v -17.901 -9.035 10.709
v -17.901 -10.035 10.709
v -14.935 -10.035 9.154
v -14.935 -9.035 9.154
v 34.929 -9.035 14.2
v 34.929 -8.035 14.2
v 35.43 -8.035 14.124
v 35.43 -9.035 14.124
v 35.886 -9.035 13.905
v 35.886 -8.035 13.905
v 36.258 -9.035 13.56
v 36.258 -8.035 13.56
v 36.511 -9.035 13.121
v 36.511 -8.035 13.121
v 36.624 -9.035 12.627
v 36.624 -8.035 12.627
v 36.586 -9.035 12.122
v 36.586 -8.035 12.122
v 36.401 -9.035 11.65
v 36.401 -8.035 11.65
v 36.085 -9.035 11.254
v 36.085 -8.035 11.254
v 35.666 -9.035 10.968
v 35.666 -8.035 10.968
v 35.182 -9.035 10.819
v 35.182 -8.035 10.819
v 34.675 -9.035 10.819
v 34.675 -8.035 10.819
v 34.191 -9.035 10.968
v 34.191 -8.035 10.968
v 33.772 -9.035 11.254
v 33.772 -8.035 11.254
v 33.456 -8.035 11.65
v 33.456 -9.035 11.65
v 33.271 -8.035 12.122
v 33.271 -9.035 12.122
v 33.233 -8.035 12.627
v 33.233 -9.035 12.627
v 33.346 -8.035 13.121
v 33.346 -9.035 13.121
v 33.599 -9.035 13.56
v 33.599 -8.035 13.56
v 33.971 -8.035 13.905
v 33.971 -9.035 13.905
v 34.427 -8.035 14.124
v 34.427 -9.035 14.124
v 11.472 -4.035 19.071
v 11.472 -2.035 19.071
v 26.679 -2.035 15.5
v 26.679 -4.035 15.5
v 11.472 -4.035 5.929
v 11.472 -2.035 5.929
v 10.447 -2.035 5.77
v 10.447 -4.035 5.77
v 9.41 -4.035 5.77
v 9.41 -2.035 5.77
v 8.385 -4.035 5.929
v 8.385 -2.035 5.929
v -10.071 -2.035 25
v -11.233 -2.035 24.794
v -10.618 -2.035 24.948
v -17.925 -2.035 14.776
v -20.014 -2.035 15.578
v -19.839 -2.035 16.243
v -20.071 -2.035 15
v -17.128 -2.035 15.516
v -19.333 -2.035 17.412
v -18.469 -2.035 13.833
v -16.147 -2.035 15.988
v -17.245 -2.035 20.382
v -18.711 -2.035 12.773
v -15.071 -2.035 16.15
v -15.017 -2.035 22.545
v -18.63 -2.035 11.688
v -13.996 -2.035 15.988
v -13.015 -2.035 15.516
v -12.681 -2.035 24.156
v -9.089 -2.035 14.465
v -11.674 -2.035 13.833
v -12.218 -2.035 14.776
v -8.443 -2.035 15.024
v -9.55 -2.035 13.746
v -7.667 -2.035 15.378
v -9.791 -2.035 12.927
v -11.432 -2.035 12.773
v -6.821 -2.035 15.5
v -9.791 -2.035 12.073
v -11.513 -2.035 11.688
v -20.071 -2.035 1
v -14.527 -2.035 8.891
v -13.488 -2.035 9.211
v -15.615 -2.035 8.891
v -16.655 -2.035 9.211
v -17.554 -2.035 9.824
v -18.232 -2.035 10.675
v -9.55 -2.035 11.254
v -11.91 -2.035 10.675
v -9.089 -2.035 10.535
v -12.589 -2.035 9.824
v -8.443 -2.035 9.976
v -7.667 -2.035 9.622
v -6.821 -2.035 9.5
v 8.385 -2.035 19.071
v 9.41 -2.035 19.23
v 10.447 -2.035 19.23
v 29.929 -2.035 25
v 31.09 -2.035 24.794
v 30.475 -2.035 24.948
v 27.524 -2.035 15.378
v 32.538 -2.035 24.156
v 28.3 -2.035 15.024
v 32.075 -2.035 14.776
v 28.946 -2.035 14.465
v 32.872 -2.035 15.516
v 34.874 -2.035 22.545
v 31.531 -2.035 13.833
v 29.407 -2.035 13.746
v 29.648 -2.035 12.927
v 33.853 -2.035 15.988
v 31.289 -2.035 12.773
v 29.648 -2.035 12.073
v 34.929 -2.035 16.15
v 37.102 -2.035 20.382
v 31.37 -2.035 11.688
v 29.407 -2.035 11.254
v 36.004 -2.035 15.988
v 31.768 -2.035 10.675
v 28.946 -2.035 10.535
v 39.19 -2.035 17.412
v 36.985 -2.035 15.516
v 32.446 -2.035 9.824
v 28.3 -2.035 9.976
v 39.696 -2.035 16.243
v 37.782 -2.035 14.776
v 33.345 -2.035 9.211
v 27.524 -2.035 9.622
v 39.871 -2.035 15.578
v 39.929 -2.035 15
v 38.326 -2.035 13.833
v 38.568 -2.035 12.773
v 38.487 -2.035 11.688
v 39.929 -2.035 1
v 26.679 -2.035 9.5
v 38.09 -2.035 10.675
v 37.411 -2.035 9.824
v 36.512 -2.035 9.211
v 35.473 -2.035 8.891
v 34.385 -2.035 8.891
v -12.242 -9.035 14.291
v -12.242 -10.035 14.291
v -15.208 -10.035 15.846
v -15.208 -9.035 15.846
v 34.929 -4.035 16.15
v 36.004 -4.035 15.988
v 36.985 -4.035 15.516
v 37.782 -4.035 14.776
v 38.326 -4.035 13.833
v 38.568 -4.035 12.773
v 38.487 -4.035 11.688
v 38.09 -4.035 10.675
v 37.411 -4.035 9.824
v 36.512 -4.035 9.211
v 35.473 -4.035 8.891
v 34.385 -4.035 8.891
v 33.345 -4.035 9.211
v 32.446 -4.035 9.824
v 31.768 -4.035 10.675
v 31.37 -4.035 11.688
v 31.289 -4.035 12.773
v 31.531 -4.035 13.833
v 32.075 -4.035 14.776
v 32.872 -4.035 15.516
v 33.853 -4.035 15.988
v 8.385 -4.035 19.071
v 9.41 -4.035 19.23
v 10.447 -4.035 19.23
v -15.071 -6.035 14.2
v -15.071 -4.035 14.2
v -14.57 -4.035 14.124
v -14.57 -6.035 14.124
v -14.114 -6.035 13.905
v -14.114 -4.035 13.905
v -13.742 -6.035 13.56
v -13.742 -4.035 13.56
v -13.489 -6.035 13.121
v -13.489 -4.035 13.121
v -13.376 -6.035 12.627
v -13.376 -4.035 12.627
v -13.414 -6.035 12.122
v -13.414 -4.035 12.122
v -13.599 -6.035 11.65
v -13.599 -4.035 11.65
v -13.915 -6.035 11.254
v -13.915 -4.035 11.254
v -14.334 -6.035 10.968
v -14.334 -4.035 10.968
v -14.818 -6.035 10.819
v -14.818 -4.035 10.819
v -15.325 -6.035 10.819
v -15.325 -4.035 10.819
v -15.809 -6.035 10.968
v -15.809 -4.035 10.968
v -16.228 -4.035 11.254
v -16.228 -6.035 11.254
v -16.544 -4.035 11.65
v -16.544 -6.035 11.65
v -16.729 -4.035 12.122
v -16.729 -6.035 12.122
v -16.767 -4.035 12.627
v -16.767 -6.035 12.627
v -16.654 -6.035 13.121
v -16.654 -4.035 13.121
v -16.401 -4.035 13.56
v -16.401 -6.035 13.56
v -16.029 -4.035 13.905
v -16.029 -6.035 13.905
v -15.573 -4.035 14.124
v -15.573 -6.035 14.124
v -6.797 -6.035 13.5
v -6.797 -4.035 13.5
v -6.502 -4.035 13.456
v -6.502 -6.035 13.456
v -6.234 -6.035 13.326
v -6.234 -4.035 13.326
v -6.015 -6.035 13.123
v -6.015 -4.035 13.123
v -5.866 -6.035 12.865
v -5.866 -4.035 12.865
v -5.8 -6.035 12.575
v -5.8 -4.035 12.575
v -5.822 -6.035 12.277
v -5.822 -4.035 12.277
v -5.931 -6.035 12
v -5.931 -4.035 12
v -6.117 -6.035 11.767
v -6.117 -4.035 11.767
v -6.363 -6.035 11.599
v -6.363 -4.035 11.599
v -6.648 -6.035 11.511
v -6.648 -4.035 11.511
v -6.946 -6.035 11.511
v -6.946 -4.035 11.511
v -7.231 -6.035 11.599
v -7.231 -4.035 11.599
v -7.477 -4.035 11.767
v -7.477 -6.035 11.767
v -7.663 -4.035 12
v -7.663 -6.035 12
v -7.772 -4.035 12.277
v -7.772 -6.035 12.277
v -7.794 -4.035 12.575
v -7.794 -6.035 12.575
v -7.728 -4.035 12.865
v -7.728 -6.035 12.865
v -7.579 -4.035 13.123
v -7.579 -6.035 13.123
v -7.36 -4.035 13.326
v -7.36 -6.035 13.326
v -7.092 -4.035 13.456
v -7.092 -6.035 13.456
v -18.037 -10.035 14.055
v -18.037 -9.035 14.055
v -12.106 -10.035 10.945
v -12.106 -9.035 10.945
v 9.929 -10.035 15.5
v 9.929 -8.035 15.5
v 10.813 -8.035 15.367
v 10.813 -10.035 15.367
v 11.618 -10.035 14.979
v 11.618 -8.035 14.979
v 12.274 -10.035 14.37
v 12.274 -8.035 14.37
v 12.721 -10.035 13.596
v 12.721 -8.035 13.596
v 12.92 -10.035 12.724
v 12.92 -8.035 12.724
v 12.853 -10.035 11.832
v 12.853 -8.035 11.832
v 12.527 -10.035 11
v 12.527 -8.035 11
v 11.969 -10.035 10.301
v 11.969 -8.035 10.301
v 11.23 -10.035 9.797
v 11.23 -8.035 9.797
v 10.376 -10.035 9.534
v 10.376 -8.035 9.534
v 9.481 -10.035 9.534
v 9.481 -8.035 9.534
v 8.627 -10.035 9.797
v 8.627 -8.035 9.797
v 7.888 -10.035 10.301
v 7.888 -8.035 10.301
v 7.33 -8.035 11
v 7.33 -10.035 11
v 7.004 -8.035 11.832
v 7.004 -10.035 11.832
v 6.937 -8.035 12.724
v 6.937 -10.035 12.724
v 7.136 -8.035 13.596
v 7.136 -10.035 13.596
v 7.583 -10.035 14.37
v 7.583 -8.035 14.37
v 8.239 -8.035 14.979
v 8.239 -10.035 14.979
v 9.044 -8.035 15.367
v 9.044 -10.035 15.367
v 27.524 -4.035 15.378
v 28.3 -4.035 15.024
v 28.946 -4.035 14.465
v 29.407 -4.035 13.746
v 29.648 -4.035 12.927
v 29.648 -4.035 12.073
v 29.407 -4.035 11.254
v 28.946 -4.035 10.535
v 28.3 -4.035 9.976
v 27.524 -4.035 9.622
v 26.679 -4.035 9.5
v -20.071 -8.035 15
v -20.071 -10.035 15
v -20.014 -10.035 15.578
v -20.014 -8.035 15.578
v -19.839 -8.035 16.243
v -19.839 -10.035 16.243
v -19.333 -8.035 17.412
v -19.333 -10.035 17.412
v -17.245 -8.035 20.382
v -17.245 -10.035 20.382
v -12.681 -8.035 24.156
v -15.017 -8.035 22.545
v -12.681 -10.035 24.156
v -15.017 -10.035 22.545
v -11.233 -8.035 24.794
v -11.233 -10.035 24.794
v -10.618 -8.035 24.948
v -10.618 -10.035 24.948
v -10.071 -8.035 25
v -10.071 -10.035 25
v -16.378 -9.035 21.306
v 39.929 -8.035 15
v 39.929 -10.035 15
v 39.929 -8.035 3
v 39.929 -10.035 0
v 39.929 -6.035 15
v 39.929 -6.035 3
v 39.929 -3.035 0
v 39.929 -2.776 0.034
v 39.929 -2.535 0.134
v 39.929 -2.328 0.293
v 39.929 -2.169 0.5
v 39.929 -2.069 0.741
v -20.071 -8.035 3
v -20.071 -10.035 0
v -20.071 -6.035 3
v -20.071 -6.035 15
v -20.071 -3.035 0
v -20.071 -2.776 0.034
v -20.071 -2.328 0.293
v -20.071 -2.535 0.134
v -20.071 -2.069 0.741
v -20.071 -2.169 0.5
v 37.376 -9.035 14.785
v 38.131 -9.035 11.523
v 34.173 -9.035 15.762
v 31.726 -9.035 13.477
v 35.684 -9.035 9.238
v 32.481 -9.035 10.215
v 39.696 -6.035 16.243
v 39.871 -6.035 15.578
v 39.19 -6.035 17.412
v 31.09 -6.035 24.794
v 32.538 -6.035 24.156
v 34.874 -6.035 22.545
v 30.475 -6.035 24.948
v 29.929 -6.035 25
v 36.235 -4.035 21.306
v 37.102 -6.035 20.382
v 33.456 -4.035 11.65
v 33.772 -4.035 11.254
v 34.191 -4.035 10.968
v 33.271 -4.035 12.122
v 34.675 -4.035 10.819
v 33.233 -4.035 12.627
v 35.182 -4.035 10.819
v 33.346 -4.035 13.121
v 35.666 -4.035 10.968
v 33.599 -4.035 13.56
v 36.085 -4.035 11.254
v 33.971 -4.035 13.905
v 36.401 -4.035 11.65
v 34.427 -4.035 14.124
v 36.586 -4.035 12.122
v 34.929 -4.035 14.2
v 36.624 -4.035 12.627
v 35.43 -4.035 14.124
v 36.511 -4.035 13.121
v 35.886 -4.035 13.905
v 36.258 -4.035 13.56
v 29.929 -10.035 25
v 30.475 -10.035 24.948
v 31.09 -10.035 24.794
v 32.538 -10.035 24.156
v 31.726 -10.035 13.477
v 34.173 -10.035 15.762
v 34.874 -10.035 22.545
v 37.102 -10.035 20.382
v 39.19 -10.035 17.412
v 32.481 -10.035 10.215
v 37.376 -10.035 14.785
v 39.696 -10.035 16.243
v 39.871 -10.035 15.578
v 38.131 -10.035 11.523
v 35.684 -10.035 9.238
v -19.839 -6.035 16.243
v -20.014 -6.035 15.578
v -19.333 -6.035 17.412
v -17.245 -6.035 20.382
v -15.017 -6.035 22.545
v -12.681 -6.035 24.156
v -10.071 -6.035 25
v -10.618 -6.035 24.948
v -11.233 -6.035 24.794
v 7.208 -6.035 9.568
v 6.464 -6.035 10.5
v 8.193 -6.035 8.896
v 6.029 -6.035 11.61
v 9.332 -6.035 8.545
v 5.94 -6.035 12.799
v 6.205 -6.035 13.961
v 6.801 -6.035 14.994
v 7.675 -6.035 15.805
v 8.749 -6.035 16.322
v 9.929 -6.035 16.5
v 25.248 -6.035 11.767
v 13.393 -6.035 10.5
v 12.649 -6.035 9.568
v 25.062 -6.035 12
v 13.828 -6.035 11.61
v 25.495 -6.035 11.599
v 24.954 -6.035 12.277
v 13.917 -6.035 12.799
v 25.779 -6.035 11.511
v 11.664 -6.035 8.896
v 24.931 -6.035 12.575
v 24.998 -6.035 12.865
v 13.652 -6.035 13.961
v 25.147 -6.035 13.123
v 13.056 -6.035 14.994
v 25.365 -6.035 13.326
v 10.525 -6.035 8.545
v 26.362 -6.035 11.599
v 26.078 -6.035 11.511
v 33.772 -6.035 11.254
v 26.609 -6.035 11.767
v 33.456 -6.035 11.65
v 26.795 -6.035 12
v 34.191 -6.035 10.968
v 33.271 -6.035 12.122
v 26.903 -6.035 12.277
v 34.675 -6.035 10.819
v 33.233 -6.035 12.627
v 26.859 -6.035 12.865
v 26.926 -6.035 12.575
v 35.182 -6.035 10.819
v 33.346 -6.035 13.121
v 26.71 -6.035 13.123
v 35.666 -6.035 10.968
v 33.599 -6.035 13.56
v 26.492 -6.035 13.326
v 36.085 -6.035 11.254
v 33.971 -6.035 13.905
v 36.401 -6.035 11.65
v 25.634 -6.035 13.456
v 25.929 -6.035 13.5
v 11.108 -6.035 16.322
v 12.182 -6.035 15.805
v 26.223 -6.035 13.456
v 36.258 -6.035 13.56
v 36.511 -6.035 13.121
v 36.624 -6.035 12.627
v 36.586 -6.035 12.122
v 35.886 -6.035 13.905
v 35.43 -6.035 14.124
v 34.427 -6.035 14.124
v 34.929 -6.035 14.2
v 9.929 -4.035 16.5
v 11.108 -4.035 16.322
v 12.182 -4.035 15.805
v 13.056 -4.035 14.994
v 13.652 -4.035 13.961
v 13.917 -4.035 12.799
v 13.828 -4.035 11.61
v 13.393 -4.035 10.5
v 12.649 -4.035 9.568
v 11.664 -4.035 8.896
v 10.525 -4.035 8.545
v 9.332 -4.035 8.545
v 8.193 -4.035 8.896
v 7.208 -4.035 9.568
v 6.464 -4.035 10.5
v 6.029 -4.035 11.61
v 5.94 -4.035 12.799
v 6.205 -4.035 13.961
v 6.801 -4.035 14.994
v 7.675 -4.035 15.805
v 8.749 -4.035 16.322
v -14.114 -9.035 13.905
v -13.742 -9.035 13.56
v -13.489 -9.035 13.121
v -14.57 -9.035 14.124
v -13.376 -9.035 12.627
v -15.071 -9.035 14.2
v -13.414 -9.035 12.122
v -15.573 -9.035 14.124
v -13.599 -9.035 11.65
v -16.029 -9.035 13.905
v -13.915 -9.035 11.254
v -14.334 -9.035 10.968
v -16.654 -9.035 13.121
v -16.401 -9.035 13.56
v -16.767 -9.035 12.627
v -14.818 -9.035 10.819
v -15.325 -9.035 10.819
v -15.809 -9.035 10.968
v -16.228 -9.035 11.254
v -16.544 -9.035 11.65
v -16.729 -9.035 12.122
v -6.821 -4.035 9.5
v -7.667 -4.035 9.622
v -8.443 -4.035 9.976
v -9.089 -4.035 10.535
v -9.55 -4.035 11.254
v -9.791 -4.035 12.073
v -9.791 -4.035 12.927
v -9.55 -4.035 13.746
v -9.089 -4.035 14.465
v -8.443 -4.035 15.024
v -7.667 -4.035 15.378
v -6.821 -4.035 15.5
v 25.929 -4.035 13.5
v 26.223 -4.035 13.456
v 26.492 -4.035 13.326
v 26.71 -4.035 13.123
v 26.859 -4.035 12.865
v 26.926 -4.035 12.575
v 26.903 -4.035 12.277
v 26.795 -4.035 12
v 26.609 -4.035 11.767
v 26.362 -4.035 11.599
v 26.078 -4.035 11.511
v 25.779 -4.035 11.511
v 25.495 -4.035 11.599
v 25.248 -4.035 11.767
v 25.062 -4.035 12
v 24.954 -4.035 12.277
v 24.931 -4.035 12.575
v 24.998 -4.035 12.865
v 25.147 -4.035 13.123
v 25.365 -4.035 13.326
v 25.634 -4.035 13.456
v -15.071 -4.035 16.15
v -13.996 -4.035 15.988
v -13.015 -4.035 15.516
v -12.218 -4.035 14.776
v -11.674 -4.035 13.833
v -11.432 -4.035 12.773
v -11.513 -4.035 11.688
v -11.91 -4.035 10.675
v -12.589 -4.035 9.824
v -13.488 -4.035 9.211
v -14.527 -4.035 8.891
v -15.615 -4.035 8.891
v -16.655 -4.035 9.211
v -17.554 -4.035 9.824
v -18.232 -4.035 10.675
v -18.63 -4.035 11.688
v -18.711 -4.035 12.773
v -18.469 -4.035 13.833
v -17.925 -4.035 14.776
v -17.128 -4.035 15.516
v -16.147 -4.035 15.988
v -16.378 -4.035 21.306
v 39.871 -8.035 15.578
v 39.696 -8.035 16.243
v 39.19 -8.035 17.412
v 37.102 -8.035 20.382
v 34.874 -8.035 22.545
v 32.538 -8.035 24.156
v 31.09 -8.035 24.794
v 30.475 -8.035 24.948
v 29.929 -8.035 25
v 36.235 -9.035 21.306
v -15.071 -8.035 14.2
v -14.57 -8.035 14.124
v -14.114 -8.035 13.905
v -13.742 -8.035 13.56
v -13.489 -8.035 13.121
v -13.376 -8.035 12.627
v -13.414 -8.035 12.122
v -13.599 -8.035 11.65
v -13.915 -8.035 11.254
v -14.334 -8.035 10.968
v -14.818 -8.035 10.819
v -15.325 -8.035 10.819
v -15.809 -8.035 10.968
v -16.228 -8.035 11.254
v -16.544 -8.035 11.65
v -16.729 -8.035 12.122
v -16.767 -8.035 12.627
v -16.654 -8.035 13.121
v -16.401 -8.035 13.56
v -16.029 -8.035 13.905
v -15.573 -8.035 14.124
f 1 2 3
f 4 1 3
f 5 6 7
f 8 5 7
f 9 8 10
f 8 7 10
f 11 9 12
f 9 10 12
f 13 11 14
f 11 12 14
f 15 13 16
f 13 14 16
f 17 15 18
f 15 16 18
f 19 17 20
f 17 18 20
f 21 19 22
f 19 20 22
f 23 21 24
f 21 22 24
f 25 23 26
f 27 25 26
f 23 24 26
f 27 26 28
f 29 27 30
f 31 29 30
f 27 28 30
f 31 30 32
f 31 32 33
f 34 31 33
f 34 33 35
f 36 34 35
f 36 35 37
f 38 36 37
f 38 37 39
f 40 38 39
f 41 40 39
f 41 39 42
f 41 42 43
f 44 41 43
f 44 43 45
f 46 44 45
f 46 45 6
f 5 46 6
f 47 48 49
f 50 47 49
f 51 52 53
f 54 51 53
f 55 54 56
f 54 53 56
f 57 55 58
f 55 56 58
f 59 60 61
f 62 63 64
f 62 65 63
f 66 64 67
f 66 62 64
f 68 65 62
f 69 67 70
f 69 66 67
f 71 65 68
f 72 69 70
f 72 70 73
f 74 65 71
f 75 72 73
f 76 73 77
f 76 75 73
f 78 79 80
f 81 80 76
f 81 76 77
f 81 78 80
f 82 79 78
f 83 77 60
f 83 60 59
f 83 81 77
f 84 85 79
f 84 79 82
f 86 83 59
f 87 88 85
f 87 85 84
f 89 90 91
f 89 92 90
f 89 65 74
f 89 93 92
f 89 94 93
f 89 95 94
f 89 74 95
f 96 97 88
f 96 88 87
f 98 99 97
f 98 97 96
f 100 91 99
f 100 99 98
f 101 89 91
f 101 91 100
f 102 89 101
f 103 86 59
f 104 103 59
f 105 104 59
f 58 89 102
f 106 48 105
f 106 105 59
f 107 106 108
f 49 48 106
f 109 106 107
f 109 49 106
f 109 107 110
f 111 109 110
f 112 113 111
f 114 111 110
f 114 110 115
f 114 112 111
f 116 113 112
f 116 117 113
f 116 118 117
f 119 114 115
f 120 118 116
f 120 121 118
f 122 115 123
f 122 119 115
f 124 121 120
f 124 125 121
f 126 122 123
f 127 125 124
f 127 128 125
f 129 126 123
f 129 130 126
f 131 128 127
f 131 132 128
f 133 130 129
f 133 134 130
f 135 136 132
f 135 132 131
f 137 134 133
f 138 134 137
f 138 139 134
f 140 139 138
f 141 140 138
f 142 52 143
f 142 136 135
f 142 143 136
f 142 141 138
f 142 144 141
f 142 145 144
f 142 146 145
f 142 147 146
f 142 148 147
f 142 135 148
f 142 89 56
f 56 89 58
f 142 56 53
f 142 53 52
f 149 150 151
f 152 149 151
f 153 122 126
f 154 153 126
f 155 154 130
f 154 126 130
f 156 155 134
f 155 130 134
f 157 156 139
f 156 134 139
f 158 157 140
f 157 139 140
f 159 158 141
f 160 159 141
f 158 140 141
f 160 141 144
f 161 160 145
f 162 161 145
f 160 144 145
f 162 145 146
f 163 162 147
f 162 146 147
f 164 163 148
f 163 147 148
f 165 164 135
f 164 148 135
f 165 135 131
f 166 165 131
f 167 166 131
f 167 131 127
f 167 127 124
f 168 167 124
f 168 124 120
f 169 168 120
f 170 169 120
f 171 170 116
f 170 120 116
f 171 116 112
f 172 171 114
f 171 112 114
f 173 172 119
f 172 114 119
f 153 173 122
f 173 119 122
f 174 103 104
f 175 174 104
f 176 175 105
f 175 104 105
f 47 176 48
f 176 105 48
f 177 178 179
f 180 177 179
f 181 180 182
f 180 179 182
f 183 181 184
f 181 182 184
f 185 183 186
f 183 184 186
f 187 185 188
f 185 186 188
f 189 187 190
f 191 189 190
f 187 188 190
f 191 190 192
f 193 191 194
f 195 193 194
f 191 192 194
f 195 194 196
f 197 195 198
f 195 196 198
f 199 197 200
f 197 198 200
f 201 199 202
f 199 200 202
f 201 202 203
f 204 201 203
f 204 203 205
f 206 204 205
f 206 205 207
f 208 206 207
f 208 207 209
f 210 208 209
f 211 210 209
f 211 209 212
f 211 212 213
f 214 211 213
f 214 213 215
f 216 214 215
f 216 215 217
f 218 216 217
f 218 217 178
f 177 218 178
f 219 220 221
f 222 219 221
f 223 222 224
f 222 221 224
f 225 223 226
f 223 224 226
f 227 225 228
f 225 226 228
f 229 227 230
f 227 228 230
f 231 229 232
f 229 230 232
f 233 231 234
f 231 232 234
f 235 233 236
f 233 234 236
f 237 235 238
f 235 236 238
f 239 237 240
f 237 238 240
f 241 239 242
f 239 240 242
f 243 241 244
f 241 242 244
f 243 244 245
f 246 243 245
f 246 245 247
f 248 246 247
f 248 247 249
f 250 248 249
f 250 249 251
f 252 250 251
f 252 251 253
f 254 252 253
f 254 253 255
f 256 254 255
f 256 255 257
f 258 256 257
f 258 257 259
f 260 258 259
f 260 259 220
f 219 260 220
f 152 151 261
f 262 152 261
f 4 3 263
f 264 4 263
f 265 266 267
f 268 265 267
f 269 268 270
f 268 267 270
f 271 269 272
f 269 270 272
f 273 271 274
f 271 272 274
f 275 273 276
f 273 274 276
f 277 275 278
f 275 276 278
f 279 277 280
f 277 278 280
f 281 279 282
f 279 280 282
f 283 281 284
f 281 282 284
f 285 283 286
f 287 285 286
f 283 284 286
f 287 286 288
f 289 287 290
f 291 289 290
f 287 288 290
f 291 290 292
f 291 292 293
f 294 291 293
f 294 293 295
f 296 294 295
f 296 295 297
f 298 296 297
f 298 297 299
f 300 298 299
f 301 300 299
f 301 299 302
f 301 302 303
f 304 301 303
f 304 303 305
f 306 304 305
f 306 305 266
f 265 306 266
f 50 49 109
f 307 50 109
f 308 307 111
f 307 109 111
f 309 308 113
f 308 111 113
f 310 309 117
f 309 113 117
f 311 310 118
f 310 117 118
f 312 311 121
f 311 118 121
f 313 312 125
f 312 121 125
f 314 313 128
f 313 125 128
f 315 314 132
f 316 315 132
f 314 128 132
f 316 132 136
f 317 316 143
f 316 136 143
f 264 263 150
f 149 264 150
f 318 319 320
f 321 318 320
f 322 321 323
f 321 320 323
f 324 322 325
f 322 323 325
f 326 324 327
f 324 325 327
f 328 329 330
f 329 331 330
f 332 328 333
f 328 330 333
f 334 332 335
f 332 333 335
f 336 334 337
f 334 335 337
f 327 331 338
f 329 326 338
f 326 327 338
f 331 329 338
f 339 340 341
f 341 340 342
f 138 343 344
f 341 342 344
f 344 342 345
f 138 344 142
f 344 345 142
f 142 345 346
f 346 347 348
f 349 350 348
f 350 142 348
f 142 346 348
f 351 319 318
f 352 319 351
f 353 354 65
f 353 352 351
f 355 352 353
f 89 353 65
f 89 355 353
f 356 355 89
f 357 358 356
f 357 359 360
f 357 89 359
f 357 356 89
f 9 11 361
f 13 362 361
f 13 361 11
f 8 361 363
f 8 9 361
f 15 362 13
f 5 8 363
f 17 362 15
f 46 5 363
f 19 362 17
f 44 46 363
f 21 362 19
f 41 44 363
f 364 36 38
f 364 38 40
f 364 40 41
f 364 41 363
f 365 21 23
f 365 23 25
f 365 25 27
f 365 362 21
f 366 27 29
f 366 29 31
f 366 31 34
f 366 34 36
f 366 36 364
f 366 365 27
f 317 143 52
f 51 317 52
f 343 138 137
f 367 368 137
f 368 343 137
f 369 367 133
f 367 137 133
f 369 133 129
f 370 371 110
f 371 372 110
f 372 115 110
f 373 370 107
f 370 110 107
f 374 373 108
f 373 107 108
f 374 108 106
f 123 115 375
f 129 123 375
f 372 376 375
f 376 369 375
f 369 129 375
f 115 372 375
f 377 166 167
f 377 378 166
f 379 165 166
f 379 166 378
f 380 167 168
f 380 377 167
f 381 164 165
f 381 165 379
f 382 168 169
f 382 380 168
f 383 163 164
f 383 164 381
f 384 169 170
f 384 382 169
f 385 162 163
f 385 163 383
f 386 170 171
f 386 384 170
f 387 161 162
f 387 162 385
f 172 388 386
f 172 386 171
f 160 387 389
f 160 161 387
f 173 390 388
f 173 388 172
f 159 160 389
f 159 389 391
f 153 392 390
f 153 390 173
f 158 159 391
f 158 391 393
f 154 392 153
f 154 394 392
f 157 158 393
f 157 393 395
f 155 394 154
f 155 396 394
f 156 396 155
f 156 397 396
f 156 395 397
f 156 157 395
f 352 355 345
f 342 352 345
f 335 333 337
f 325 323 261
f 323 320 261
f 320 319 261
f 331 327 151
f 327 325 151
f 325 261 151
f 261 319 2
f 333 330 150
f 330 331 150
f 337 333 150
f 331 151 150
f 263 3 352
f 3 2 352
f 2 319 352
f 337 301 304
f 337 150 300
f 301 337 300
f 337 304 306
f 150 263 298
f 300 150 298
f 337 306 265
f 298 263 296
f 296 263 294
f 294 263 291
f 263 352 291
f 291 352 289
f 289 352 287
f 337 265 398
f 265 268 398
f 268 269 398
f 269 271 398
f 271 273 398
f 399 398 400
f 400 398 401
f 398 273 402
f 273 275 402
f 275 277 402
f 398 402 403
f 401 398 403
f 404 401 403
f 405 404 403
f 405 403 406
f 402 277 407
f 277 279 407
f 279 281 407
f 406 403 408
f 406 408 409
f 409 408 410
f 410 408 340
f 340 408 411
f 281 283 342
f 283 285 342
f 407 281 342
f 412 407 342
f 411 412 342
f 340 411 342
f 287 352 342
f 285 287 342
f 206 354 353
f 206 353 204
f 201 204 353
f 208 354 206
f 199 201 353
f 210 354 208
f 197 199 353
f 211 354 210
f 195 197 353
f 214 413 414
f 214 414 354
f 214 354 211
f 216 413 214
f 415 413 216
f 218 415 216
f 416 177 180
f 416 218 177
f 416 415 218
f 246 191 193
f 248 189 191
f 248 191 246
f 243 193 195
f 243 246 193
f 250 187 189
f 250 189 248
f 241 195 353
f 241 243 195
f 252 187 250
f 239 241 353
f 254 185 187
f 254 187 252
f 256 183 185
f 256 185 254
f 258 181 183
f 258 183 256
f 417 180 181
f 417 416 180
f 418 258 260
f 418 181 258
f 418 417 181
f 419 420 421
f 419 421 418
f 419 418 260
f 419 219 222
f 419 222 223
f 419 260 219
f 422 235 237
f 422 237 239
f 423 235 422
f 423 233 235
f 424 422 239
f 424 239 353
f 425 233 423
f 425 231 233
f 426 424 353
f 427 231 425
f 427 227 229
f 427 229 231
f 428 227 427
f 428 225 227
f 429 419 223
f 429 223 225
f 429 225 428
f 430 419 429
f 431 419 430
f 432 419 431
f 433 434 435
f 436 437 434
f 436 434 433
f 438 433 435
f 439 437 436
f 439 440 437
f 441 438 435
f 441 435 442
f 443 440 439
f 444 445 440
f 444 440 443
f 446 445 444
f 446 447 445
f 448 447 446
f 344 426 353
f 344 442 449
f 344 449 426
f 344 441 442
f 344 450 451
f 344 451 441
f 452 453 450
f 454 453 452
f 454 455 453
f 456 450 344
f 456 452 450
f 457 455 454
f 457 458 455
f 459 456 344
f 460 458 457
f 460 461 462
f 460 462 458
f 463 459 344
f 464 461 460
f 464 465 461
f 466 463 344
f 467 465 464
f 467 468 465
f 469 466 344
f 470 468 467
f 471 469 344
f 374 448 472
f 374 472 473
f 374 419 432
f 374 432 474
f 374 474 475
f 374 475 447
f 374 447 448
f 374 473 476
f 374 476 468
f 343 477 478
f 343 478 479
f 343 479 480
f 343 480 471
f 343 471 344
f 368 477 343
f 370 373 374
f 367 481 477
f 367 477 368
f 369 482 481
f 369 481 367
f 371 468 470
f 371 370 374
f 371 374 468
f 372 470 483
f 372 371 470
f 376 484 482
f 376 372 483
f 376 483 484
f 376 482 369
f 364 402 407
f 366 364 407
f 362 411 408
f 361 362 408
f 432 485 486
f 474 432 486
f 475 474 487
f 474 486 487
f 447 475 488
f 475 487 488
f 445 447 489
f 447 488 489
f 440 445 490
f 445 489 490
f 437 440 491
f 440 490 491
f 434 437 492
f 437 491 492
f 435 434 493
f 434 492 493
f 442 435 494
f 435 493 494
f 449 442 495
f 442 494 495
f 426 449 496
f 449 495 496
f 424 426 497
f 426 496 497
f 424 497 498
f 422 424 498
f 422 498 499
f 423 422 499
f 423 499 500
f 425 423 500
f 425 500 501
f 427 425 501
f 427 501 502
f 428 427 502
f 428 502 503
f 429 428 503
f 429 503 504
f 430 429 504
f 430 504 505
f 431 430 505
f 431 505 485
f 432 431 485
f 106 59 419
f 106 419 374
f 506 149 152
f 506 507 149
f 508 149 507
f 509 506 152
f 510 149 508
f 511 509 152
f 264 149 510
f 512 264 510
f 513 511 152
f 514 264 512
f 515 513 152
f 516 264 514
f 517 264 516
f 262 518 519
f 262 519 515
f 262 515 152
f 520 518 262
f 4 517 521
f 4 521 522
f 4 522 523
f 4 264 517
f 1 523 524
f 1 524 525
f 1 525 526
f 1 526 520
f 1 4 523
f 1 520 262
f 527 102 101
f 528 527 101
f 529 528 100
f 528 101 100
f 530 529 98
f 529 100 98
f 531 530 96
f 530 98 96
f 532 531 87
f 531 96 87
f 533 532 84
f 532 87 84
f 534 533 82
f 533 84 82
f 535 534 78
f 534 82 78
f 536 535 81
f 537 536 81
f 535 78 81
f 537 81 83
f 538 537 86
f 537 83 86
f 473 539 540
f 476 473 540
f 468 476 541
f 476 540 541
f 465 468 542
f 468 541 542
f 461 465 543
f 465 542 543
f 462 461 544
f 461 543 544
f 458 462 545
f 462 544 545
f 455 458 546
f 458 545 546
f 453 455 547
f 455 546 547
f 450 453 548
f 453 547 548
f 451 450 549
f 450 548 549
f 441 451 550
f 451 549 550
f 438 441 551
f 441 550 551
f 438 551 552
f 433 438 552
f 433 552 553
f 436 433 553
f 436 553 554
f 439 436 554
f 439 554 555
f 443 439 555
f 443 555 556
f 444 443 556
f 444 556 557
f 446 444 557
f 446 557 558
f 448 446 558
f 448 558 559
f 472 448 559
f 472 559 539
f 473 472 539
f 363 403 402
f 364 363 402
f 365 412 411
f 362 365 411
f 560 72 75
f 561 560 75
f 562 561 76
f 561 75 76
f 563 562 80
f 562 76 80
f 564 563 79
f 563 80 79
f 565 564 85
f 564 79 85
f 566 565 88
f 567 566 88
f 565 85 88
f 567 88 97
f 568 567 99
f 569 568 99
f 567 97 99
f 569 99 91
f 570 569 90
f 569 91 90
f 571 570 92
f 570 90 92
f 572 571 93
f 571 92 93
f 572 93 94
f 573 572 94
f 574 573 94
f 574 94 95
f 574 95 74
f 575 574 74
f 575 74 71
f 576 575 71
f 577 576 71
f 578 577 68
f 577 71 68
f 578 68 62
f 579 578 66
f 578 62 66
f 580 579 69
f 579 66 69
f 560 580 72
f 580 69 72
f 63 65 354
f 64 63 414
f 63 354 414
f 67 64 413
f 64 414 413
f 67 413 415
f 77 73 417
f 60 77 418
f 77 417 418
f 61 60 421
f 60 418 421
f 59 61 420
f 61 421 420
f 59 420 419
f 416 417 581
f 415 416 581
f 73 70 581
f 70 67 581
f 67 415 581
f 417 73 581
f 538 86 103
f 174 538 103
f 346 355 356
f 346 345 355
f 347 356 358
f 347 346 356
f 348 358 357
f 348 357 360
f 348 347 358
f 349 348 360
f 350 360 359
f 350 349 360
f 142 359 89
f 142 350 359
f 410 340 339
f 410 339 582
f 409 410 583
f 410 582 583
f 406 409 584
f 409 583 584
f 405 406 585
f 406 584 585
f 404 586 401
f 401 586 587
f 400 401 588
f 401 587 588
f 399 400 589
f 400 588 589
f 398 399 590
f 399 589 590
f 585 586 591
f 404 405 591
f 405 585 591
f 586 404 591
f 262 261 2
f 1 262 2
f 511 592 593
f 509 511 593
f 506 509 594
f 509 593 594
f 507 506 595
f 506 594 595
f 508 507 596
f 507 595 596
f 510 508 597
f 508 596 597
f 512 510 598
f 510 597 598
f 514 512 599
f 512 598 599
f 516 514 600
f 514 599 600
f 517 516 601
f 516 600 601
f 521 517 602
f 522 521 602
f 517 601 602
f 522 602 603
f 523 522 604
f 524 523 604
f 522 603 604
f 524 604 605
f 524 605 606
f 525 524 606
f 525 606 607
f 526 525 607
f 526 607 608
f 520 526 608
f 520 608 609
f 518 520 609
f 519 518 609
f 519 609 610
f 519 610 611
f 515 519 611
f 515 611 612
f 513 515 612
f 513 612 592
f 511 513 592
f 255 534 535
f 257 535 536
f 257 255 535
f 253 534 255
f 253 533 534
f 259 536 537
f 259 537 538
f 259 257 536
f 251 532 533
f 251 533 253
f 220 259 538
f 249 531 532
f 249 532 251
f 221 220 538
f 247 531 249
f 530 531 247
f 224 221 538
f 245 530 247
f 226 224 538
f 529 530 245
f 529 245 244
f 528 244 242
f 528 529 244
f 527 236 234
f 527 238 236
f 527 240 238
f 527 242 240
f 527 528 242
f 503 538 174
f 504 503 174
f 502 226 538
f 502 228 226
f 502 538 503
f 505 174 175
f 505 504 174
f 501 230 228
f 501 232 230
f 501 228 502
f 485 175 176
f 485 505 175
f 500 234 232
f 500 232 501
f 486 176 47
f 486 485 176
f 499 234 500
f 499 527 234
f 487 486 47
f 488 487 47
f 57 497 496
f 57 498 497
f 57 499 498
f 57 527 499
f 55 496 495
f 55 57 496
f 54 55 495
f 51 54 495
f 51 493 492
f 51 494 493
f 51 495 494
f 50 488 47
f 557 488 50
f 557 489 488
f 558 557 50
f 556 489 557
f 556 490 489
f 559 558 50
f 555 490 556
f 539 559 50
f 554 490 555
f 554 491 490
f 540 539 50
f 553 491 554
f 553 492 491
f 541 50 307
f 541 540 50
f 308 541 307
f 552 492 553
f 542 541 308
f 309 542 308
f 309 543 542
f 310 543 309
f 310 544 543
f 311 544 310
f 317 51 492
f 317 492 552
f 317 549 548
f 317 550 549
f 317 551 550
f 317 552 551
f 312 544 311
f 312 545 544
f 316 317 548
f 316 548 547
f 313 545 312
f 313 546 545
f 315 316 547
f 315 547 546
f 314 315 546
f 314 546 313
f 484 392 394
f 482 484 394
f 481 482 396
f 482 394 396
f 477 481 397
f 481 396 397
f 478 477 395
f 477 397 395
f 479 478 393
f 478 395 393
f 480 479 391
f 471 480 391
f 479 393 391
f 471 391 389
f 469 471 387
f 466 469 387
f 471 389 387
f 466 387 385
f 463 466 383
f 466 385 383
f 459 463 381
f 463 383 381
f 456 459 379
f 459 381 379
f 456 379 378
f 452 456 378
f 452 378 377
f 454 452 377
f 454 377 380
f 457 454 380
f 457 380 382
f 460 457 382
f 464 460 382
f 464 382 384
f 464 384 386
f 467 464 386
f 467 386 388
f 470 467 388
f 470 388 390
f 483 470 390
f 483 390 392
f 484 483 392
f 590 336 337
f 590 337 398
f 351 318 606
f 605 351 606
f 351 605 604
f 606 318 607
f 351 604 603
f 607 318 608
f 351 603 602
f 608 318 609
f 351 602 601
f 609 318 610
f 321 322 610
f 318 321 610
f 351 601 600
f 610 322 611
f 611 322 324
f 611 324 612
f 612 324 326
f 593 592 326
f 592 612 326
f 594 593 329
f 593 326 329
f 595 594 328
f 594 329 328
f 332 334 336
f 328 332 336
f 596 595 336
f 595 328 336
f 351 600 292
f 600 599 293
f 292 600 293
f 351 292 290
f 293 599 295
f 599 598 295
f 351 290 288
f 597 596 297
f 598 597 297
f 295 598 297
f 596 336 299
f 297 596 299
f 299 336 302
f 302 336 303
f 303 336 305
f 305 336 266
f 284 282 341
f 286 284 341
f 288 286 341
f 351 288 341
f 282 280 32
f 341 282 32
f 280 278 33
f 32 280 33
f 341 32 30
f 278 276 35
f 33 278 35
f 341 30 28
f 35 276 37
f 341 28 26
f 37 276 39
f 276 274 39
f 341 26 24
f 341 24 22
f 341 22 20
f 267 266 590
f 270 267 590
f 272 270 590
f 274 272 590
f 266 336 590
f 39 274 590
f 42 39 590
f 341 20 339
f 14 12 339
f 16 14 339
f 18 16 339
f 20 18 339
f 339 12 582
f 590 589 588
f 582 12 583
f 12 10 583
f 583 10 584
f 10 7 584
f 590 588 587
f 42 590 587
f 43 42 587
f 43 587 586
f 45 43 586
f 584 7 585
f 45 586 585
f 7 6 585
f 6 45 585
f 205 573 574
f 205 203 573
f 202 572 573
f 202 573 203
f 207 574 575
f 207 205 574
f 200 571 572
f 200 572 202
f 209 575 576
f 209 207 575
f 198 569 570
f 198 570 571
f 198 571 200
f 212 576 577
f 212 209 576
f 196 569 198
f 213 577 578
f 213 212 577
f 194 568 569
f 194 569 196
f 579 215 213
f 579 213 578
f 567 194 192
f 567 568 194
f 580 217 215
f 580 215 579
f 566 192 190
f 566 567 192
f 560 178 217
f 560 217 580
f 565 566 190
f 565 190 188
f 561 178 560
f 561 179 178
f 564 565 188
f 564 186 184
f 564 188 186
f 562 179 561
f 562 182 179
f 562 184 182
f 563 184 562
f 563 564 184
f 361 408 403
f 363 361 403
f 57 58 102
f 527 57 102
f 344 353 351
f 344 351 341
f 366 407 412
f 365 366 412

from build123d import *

# Parameters (mm, degrees)
SKETCH1_W           = 60
SKETCH1_H           = 8
BOSS_EXTRUDE1_DEPTH = 25
SKETCH2_W           = 60
SKETCH2_H           = 2
CUT_EXTRUDE1_DEPTH  = 22
CUT_EXTRUDE2_DEPTH  = 2
SKETCH4_R           = 1
SKETCH4_R_2         = 4
CUT_EXTRUDE3_DEPTH  = 2.5
SKETCH5_R           = 1.7
CUT_EXTRUDE4_DEPTH  = 9
FILLET1_R           = 1
FILLET2_SIZE        = 10
SKETCH6_R           = 3
CUT_EXTRUDE5_DEPTH  = 4.5
CUT_EXTRUDE6_DEPTH  = 1
SKETCH8_R           = 3.65
CUT_EXTRUDE7_DEPTH  = 2


with BuildPart() as part:
    # Sketch1 → Boss-Extrude1 (new body)
    with BuildSketch(Plane.XY):
        with Locations((9.92851316, -6.03519833)):
            Rectangle(SKETCH1_W, SKETCH1_H)
    extrude(amount=BOSS_EXTRUDE1_DEPTH)

    # Sketch2 → Cut-Extrude1 (cut)
    with BuildSketch(Plane.XY.offset(25)):
        with Locations((9.92851316, -7.03519833)):
            Rectangle(SKETCH2_W, SKETCH2_H)
    extrude(amount=-CUT_EXTRUDE1_DEPTH, mode=Mode.SUBTRACT)

    # Sketch3 → Cut-Extrude2 (cut)
    with BuildSketch(Plane(origin=(0, -2.03519833, 0), x_dir=(1, 0, 0), z_dir=(0, 1, 0))):
        with BuildLine():
            Line((26.67851316, -9.5), (11.471726674, -5.928775453))
            ThreePointArc((11.471726674, -5.928775453), (9.92851316, -5.75), (8.385299646, -5.928775453))
            Line((8.385299646, -5.928775453), (-6.82148684, -9.5))
            ThreePointArc((-6.82148684, -9.5), (-9.821486841, -12.5), (-6.82148684, -15.5))
            Line((-6.82148684, -15.5), (8.385299646, -19.071224547))
            ThreePointArc((8.385299646, -19.071224547), (9.92851316, -19.25), (11.471726674, -19.071224547))
            Line((11.471726674, -19.071224547), (26.67851316, -15.5))
            ThreePointArc((26.67851316, -15.5), (29.67851316, -12.5), (26.67851316, -9.5))
        make_face()
    extrude(amount=-CUT_EXTRUDE2_DEPTH, mode=Mode.SUBTRACT)

    # Sketch4 → Cut-Extrude3 (cut)
    with BuildSketch(Plane(origin=(0, -4.03519833, 0), x_dir=(1, 0, 0), z_dir=(0, 1, 0))):
        with Locations(Location((-6.796927173, -12.5, 0), (0, 0, 270))):
            Circle(SKETCH4_R)
        with Locations(Location((9.92851316, -12.5, 0), (0, 0, 270))):
            Circle(SKETCH4_R_2)
        with Locations(Location((25.92851316, -12.5, 0), (0, 0, 270))):
            Circle(SKETCH4_R)
    extrude(amount=-CUT_EXTRUDE3_DEPTH, mode=Mode.SUBTRACT)

    # Sketch5 → Cut-Extrude4 (cut)
    with BuildSketch(Plane(origin=(0, -2.03519833, 0), x_dir=(1, 0, 0), z_dir=(0, 1, 0))):
        with Locations(Location((34.92851316, -12.5, 0), (0, 0, 270))):
            Circle(SKETCH5_R)
        with Locations(Location((-15.07148684, -12.5, 0), (0, 0, 270))):
            Circle(SKETCH5_R)
    extrude(amount=-CUT_EXTRUDE4_DEPTH, mode=Mode.SUBTRACT)

    # Fillet1
    fillet1_edges = [part.edges().sort_by_distance(p)[0] for p in [
        (9.92851316, -2.03519833, 0),
    ]]
    fillet(fillet1_edges, radius=FILLET1_R)

    # Fillet2
    # a fillet whose section is not a circle: 10 mm, written as the material it takes off along each edge
    with BuildSketch(Plane(origin=(-20.07148684, -31.03519833, 25), x_dir=(0, 0, -1), z_dir=(0, 1, 0))) as fillet2_piece_1:
        with BuildLine():
            Bezier((FILLET2_SIZE, 0), (0, 0), (0, -FILLET2_SIZE), weights=[1, 0.353553391, 1])
            Line((0, -FILLET2_SIZE), (0, 0))
            Line((0, 0), (FILLET2_SIZE, 0))
        make_face()
    extrude(amount=54, mode=Mode.SUBTRACT)
    with BuildSketch(Plane(origin=(-20.07148684, -35.03519833, 25), x_dir=(0, 0, -1), z_dir=(0, 1, 0)), Plane(origin=(39.92851316, 16.96480167, 25), x_dir=(0, 0, -1), z_dir=(0, -1, 0))) as fillet2_piece_2:
        with BuildLine():
            Bezier((FILLET2_SIZE, 0), (0, 0), (0, -FILLET2_SIZE), weights=[1, 0.353553391, 1])
            Line((0, -FILLET2_SIZE), (0, 0))
            Line((0, 0), (FILLET2_SIZE, 0))
        make_face()
    extrude(amount=52, mode=Mode.SUBTRACT)
    with BuildSketch(Plane(origin=(39.92851316, 22.96480167, 25), x_dir=(-1, 0, 0), z_dir=(0, -1, 0))) as fillet2_piece_3:
        with BuildLine():
            Bezier((FILLET2_SIZE, 0), (0, 0), (0, FILLET2_SIZE), weights=[1, 0.353553391, 1])
            Line((0, FILLET2_SIZE), (0, 0))
            Line((0, 0), (FILLET2_SIZE, 0))
        make_face()
    extrude(amount=54, mode=Mode.SUBTRACT)

    # Sketch6 → Cut-Extrude5 (cut)
    with BuildSketch(Plane(origin=(0, -8.03519833, 0), x_dir=(1, 0, 0), z_dir=(0, 1, 0))):
        with Locations(Location((9.92851316, -12.5, 0), (0, 0, 270))):
            Circle(SKETCH6_R)
    extrude(amount=-CUT_EXTRUDE5_DEPTH, mode=Mode.SUBTRACT)

    # Sketch7 → Cut-Extrude6 (cut)
    with BuildSketch(Plane(origin=(0, -10.03519833, 0), x_dir=(-1, 0, 0), z_dir=(0, -1, 0))):
        Polygon((-35.683884991, -9.237677709), (-38.131453055, -11.52301005), (-37.376081224, -14.785332341), (-34.173141329, -15.762322291), (-31.725573265, -13.47698995), (-32.480945096, -10.214667659), align=None)
        Polygon((12.105656047, -10.945271393), (12.242136974, -14.291120506), (15.207967766, -15.845849113), (18.037317633, -14.054728607), (17.900836706, -10.708879494), (14.935005914, -9.154150887), align=None)
    extrude(amount=-CUT_EXTRUDE6_DEPTH, mode=Mode.SUBTRACT)

    # Sketch8 → Cut-Extrude7 (cut)
    with BuildSketch(Plane(origin=(0, -2.03519833, 0), x_dir=(1, 0, 0), z_dir=(0, 1, 0))):
        with Locations(Location((-15.07148684, -12.5, 0), (0, 0, 270))):
            Circle(SKETCH8_R)
        with Locations(Location((34.92851316, -12.5, 0), (0, 0, 270))):
            Circle(SKETCH8_R)
    extrude(amount=-CUT_EXTRUDE7_DEPTH, mode=Mode.SUBTRACT)


solid = part.part
